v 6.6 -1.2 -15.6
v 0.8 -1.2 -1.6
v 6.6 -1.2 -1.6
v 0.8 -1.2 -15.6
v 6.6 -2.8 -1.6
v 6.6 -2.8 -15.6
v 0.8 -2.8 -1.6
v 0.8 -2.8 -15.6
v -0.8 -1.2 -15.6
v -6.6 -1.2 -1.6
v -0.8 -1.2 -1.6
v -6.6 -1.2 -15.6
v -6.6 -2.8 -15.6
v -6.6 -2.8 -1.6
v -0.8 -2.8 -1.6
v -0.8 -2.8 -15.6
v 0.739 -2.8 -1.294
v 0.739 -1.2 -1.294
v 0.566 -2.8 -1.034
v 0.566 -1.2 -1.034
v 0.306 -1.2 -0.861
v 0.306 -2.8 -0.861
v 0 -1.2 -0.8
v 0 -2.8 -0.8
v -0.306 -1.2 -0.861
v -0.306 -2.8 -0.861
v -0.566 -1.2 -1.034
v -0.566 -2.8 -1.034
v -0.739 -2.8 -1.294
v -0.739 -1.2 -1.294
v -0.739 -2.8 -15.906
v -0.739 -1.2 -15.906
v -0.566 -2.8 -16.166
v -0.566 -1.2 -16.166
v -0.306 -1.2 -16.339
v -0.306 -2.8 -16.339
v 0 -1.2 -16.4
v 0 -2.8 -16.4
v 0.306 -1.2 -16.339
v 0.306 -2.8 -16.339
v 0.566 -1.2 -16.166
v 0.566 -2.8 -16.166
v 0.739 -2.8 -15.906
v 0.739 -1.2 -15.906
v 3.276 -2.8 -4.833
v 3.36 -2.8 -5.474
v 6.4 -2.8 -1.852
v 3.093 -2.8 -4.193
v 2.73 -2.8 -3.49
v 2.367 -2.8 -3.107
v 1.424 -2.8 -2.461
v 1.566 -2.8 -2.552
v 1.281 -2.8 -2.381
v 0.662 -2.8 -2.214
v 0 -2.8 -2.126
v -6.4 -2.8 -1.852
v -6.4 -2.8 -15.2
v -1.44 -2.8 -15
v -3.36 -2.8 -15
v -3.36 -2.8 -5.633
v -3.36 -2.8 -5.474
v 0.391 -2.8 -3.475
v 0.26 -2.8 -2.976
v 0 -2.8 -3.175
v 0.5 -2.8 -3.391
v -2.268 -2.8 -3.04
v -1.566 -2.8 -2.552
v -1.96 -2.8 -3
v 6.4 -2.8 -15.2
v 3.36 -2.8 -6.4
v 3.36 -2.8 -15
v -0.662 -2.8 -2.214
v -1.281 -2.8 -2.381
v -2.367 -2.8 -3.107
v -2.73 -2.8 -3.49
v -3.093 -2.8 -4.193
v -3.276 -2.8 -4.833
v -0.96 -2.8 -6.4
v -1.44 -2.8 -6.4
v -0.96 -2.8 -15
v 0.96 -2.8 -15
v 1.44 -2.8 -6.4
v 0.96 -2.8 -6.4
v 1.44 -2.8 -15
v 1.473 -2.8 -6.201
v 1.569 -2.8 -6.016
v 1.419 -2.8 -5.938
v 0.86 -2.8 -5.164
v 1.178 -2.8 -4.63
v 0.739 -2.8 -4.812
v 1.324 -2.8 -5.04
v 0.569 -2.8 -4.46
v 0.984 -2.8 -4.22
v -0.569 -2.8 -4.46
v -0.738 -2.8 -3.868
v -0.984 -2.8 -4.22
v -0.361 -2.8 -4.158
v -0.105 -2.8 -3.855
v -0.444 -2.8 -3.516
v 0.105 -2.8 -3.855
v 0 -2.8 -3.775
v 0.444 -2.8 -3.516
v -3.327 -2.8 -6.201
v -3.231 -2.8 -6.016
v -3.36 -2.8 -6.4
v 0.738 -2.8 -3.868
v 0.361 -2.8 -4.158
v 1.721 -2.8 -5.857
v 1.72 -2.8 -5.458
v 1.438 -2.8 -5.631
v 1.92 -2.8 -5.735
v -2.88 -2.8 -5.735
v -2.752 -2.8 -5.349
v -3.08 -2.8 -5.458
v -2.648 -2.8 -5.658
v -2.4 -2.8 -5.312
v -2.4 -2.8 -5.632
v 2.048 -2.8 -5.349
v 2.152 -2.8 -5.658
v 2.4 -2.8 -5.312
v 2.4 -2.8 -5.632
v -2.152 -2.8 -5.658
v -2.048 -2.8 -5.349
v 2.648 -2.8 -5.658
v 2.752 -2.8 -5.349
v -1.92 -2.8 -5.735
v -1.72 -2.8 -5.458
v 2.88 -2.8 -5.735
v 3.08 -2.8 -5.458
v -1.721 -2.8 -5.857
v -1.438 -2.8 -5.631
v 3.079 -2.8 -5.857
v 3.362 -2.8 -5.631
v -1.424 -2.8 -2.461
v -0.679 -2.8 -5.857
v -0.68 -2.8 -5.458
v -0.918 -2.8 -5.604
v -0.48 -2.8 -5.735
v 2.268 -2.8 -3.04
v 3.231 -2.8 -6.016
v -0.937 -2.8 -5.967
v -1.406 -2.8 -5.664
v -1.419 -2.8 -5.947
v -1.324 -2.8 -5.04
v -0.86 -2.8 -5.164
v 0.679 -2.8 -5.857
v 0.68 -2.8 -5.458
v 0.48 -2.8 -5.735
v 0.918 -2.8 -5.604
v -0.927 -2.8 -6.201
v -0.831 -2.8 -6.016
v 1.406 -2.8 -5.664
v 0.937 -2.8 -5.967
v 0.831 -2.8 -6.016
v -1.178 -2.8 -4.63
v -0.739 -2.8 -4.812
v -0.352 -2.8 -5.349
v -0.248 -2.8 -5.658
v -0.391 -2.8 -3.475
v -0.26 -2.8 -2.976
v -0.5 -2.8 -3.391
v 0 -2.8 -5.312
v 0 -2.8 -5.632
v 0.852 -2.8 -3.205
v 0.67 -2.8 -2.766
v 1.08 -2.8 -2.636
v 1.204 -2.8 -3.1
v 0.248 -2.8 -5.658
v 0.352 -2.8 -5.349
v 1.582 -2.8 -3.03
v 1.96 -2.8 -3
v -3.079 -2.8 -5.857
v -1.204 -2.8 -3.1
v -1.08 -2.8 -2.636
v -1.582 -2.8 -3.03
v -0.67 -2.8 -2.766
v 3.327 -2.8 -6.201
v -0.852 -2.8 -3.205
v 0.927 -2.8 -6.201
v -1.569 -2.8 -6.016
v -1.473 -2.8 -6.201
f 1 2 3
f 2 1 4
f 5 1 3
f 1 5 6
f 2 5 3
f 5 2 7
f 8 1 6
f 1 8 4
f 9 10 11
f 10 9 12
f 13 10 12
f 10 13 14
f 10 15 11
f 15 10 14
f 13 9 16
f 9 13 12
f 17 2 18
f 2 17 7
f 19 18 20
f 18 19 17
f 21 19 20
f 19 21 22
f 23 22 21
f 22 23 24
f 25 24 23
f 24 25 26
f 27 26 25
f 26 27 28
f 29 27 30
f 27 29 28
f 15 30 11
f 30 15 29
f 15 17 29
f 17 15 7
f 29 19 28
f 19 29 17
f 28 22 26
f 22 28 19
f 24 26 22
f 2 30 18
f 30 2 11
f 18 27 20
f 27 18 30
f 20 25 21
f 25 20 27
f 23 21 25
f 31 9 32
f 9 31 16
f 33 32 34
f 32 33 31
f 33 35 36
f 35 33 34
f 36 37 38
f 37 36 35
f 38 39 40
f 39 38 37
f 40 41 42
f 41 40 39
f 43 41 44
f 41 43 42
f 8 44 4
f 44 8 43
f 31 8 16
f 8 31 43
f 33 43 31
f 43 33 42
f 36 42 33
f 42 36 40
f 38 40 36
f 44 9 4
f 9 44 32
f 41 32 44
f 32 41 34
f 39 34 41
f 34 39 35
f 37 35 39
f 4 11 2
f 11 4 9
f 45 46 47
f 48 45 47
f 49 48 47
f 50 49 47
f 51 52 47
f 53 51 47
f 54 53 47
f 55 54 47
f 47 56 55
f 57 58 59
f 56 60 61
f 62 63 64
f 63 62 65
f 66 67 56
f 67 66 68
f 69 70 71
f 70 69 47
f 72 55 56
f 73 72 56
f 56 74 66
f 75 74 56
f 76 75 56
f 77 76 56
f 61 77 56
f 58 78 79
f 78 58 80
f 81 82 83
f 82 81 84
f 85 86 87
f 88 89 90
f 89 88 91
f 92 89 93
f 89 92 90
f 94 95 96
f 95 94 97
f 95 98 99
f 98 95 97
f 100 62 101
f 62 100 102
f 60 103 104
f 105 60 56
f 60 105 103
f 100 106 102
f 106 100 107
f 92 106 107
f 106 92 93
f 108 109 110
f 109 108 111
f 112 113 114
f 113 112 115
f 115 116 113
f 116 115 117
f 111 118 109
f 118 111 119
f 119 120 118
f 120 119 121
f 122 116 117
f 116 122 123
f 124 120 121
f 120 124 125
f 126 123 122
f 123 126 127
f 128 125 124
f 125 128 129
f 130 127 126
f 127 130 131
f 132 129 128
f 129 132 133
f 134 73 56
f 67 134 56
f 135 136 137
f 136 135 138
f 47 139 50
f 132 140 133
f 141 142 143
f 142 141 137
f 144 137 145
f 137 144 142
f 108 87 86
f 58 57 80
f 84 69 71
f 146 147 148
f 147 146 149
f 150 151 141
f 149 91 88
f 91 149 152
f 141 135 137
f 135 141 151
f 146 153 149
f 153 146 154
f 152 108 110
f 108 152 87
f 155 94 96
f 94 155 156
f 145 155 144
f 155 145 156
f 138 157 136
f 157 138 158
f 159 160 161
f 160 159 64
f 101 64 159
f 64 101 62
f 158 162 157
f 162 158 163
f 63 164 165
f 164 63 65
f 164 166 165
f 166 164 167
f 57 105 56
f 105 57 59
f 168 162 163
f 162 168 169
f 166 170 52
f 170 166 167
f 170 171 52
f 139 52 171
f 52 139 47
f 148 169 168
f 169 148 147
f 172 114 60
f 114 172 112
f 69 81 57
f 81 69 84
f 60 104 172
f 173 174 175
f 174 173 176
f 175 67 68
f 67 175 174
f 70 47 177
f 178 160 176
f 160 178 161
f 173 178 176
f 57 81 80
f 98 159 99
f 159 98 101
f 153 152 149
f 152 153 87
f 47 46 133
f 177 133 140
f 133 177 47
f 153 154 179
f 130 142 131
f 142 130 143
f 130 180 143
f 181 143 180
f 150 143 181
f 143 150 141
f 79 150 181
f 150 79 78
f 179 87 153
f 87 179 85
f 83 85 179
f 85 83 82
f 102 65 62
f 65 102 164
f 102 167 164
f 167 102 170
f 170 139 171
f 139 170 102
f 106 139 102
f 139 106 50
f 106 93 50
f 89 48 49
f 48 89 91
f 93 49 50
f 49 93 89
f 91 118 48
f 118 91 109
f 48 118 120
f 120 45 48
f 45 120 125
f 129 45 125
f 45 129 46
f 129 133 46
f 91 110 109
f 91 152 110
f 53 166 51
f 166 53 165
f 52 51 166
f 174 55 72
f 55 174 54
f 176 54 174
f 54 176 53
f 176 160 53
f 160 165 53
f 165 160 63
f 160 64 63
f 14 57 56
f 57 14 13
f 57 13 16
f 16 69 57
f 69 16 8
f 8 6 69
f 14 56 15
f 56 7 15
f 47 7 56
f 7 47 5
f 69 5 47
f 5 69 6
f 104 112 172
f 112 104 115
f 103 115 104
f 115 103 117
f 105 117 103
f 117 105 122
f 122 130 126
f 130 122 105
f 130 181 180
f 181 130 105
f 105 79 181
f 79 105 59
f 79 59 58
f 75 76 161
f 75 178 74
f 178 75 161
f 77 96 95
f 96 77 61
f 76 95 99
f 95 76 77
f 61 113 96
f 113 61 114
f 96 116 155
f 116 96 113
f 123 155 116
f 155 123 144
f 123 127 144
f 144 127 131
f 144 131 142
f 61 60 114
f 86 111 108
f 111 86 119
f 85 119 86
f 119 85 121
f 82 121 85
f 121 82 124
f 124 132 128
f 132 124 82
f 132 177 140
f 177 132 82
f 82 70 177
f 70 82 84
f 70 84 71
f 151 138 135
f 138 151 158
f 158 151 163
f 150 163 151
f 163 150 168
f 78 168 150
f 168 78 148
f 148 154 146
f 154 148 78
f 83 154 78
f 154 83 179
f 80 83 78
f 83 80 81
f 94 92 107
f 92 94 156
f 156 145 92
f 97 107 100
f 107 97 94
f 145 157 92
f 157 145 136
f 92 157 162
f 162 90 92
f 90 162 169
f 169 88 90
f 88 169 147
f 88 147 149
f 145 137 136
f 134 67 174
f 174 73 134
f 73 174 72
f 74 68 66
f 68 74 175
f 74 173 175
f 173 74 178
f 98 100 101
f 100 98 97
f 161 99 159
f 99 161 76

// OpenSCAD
use <../lib.scad>
use <s/60601s01.scad>
$fa=1; $fs=0.2;
function ldraw_lib__60601p01(realsolid=false) = [
// 0 Glass for Window  1 x  2 x  2 with Tan Gothic Ornament Pattern
// 0 Name: 60601p01.dat
// 0 Author: Ulrich Röder [UR]
// 0 !LDRAW_ORG Part UPDATE 2019-02
// 0 !LICENSE Licensed under CC BY 2.0 and CC BY 4.0 : see CAreadme.txt
// 
// 0 BFC CERTIFY CCW
  [0,"BFC","CERTIFY"],
  [0,"BFC","CCW"],
// 
// 0 !HISTORY 2019-09-09 [PTadmin] Official Update 2019-02
// 
// 
// 1 16 0 0 0 1 0 0 0 1 0 0 0 1 s\60601s01.dat
  [1,16,0,0,0,1,0,0,0,1,0,0,0,1, ldraw_lib__s__60601s01(realsolid)],
// 
// 0 BFC NOCLIP
  [0,"BFC","NOCLIP"],
// 0 // Tan
// 3 19 8.19 12.083 -7 8.4 13.684 -7 16 4.631 -7
  [3,19,8.19,12.083,-7,8.4,13.684,-7,16,4.631,-7],
// 3 19 7.732 10.482 -7 8.19 12.083 -7 16 4.631 -7
  [3,19,7.732,10.482,-7,8.19,12.083,-7,16,4.631,-7],
// 3 19 6.825 8.7245 -7 7.732 10.482 -7 16 4.631 -7
  [3,19,6.825,8.7245,-7,7.732,10.482,-7,16,4.631,-7],
// 3 19 5.918 7.767 -7 6.825 8.7245 -7 16 4.631 -7
  [3,19,5.918,7.767,-7,6.825,8.7245,-7,16,4.631,-7],
// 3 19 3.5595 6.1515 -7 3.916 6.38 -7 16 4.631 -7
  [3,19,3.5595,6.1515,-7,3.916,6.38,-7,16,4.631,-7],
// 3 19 3.203 5.953 -7 3.5595 6.1515 -7 16 4.631 -7
  [3,19,3.203,5.953,-7,3.5595,6.1515,-7,16,4.631,-7],
// 3 19 1.655 5.5345 -7 3.203 5.953 -7 16 4.631 -7
  [3,19,1.655,5.5345,-7,3.203,5.953,-7,16,4.631,-7],
// 3 19 0 5.316 -7 1.655 5.5345 -7 16 4.631 -7
  [3,19,0,5.316,-7,1.655,5.5345,-7,16,4.631,-7],
// 3 19 16 4.631 -7 -16 4.631 -7 0 5.316 -7
  [3,19,16,4.631,-7,-16,4.631,-7,0,5.316,-7],
// 3 19 -16 38 -7 -3.6 37.5 -7 -8.4 37.5 -7
  [3,19,-16,38,-7,-3.6,37.5,-7,-8.4,37.5,-7],
// 3 19 -16 4.631 -7 -8.4 14.082 -7 -8.4 13.684 -7
  [3,19,-16,4.631,-7,-8.4,14.082,-7,-8.4,13.684,-7],
// 4 19 1.25 8.478 -7 0.65 7.439 -7 0 7.938 -7 0.977 8.687 -7
  [4,19,1.25,8.478,-7,0.65,7.439,-7,0,7.938,-7,0.977,8.687,-7],
// 4 19 -4.9 7.5 -7 -3.916 6.38 -7 -16 4.631 -7 -5.67 7.601 -7
  [4,19,-4.9,7.5,-7,-3.916,6.38,-7,-16,4.631,-7,-5.67,7.601,-7],
// 4 19 16 4.631 -7 8.4 16 -7 8.4 37.5 -7 16 38 -7
  [4,19,16,4.631,-7,8.4,16,-7,8.4,37.5,-7,16,38,-7],
// 3 19 -1.655 5.5345 -7 0 5.316 -7 -16 4.631 -7
  [3,19,-1.655,5.5345,-7,0,5.316,-7,-16,4.631,-7],
// 3 19 -3.203 5.953 -7 -1.655 5.5345 -7 -16 4.631 -7
  [3,19,-3.203,5.953,-7,-1.655,5.5345,-7,-16,4.631,-7],
// 3 19 -16 4.631 -7 -5.918 7.767 -7 -5.67 7.601 -7
  [3,19,-16,4.631,-7,-5.918,7.767,-7,-5.67,7.601,-7],
// 3 19 -6.825 8.7245 -7 -5.918 7.767 -7 -16 4.631 -7
  [3,19,-6.825,8.7245,-7,-5.918,7.767,-7,-16,4.631,-7],
// 3 19 -7.732 10.482 -7 -6.825 8.7245 -7 -16 4.631 -7
  [3,19,-7.732,10.482,-7,-6.825,8.7245,-7,-16,4.631,-7],
// 3 19 -8.19 12.083 -7 -7.732 10.482 -7 -16 4.631 -7
  [3,19,-8.19,12.083,-7,-7.732,10.482,-7,-16,4.631,-7],
// 3 19 -8.4 13.684 -7 -8.19 12.083 -7 -16 4.631 -7
  [3,19,-8.4,13.684,-7,-8.19,12.083,-7,-16,4.631,-7],
// 4 19 -2.4 16 -7 -3.6 16 -7 -3.6 37.5 -7 -2.4 37.5 -7
  [4,19,-2.4,16,-7,-3.6,16,-7,-3.6,37.5,-7,-2.4,37.5,-7],
// 4 19 3.6 16 -7 2.4 16 -7 2.4 37.5 -7 3.6 37.5 -7
  [4,19,3.6,16,-7,2.4,16,-7,2.4,37.5,-7,3.6,37.5,-7],
// 3 19 3.682 15.503 -7 3.922 15.04 -7 3.547 14.845 -7
  [3,19,3.682,15.503,-7,3.922,15.04,-7,3.547,14.845,-7],
// 4 19 2.151 12.911 -7 3.31 12.6 -7 2.9455 11.575 -7 1.8465 12.0305 -7
  [4,19,2.151,12.911,-7,3.31,12.6,-7,2.9455,11.575,-7,1.8465,12.0305,-7],
// 4 19 2.461 10.55 -7 1.422 11.15 -7 1.8465 12.0305 -7 2.9455 11.575 -7
  [4,19,2.461,10.55,-7,1.422,11.15,-7,1.8465,12.0305,-7,2.9455,11.575,-7],
// 4 19 -2.461 10.55 -7 -1.422 11.15 -7 -0.902 10.394 -7 -1.8455 9.67 -7
  [4,19,-2.461,10.55,-7,-1.422,11.15,-7,-0.902,10.394,-7,-1.8455,9.67,-7],
// 4 19 -0.262 9.638 -7 -1.11 8.79 -7 -1.8455 9.67 -7 -0.902 10.394 -7
  [4,19,-0.262,9.638,-7,-1.11,8.79,-7,-1.8455,9.67,-7,-0.902,10.394,-7],
// 4 19 1.11 8.79 -7 0.977 8.687 -7 0 9.437 -7 0.262 9.638 -7
  [4,19,1.11,8.79,-7,0.977,8.687,-7,0,9.437,-7,0.262,9.638,-7],
// 3 19 -8.4 14.082 -7 -8.318 15.503 -7 -8.078 15.04 -7
  [3,19,-8.4,14.082,-7,-8.318,15.503,-7,-8.078,15.04,-7],
// 4 19 -8.4 16 -7 -8.318 15.503 -7 -8.4 14.082 -7 -16 4.631 -7
  [4,19,-8.4,16,-7,-8.318,15.503,-7,-8.4,14.082,-7,-16,4.631,-7],
// 4 19 0.902 10.394 -7 1.8455 9.67 -7 1.11 8.79 -7 0.262 9.638 -7
  [4,19,0.902,10.394,-7,1.8455,9.67,-7,1.11,8.79,-7,0.262,9.638,-7],
// 4 19 1.8455 9.67 -7 0.902 10.394 -7 1.422 11.15 -7 2.461 10.55 -7
  [4,19,1.8455,9.67,-7,0.902,10.394,-7,1.422,11.15,-7,2.461,10.55,-7],
// 4 19 4.3 13.644 -7 3.596 14.077 -7 4.303 14.642 -7 4.8 14.337 -7
  [4,19,4.3,13.644,-7,3.596,14.077,-7,4.303,14.642,-7,4.8,14.337,-7],
// 4 19 -6.88 13.373 -7 -7.7 13.644 -7 -7.2 14.337 -7 -6.621 14.145 -7
  [4,19,-6.88,13.373,-7,-7.7,13.644,-7,-7.2,14.337,-7,-6.621,14.145,-7],
// 4 19 -6.621 14.145 -7 -6 14.08 -7 -6 13.28 -7 -6.88 13.373 -7
  [4,19,-6.621,14.145,-7,-6,14.08,-7,-6,13.28,-7,-6.88,13.373,-7],
// 4 19 5.12 13.373 -7 4.3 13.644 -7 4.8 14.337 -7 5.379 14.145 -7
  [4,19,5.12,13.373,-7,4.3,13.644,-7,4.8,14.337,-7,5.379,14.145,-7],
// 4 19 5.379 14.145 -7 6 14.08 -7 6 13.28 -7 5.12 13.373 -7
  [4,19,5.379,14.145,-7,6,14.08,-7,6,13.28,-7,5.12,13.373,-7],
// 4 19 -5.12 13.373 -7 -6 13.28 -7 -6 14.08 -7 -5.379 14.145 -7
  [4,19,-5.12,13.373,-7,-6,13.28,-7,-6,14.08,-7,-5.379,14.145,-7],
// 4 19 6.88 13.373 -7 6 13.28 -7 6 14.08 -7 6.621 14.145 -7
  [4,19,6.88,13.373,-7,6,13.28,-7,6,14.08,-7,6.621,14.145,-7],
// 4 19 -4.3 13.644 -7 -5.12 13.373 -7 -5.379 14.145 -7 -4.8 14.337 -7
  [4,19,-4.3,13.644,-7,-5.12,13.373,-7,-5.379,14.145,-7,-4.8,14.337,-7],
// 4 19 7.7 13.644 -7 6.88 13.373 -7 6.621 14.145 -7 7.2 14.337 -7
  [4,19,7.7,13.644,-7,6.88,13.373,-7,6.621,14.145,-7,7.2,14.337,-7],
// 4 19 -3.596 14.077 -7 -4.3 13.644 -7 -4.8 14.337 -7 -4.303 14.642 -7
  [4,19,-3.596,14.077,-7,-4.3,13.644,-7,-4.8,14.337,-7,-4.303,14.642,-7],
// 4 19 7.2 14.337 -7 7.697 14.642 -7 8.404 14.077 -7 7.7 13.644 -7
  [4,19,7.2,14.337,-7,7.697,14.642,-7,8.404,14.077,-7,7.7,13.644,-7],
// 3 19 -3.5595 6.1515 -7 -3.203 5.953 -7 -16 4.631 -7
  [3,19,-3.5595,6.1515,-7,-3.203,5.953,-7,-16,4.631,-7],
// 3 19 -3.916 6.38 -7 -3.5595 6.1515 -7 -16 4.631 -7
  [3,19,-3.916,6.38,-7,-3.5595,6.1515,-7,-16,4.631,-7],
// 4 19 -2.296 14.01 -7 -1.697 14.642 -7 -1.2 14.337 -7 -1.7 13.644 -7
  [4,19,-2.296,14.01,-7,-1.697,14.642,-7,-1.2,14.337,-7,-1.7,13.644,-7],
// 3 19 16 4.631 -7 5.67 7.601 -7 5.918 7.767 -7
  [3,19,16,4.631,-7,5.67,7.601,-7,5.918,7.767,-7],
// 3 19 7.697 14.642 -7 8.078 15.04 -7 8.404 14.077 -7
  [3,19,7.697,14.642,-7,8.078,15.04,-7,8.404,14.077,-7],
// 4 19 -2.296 14.01 -7 -3.516 14.16 -7 -3.548 14.868 -7 -2.343 14.918 -7
  [4,19,-2.296,14.01,-7,-3.516,14.16,-7,-3.548,14.868,-7,-2.343,14.918,-7],
// 4 19 -3.31 12.6 -7 -3.516 14.16 -7 -2.296 14.01 -7 -2.151 12.911 -7
  [4,19,-3.31,12.6,-7,-3.516,14.16,-7,-2.296,14.01,-7,-2.151,12.911,-7],
// 3 19 4.303 14.642 -7 3.547 14.845 -7 3.922 15.04 -7
  [3,19,4.303,14.642,-7,3.547,14.845,-7,3.922,15.04,-7],
// 3 19 -3.6 37.5 -7 -16 38 -7 -2.4 37.5 -7
  [3,19,-3.6,37.5,-7,-16,38,-7,-2.4,37.5,-7],
// 3 19 3.6 37.5 -7 16 38 -7 8.4 37.5 -7
  [3,19,3.6,37.5,-7,16,38,-7,8.4,37.5,-7],
// 4 19 1.7 13.644 -7 1.2 14.337 -7 1.697 14.642 -7 2.296 14.01 -7
  [4,19,1.7,13.644,-7,1.2,14.337,-7,1.697,14.642,-7,2.296,14.01,-7],
// 3 19 -2.318 15.503 -7 -2.078 15.04 -7 -2.343 14.918 -7
  [3,19,-2.318,15.503,-7,-2.078,15.04,-7,-2.343,14.918,-7],
// 4 19 3.31 12.6 -7 2.151 12.911 -7 2.296 14.01 -7 3.516 14.16 -7
  [4,19,3.31,12.6,-7,2.151,12.911,-7,2.296,14.01,-7,3.516,14.16,-7],
// 4 19 -2.296 14.01 -7 -2.343 14.918 -7 -2.078 15.04 -7 -1.697 14.642 -7
  [4,19,-2.296,14.01,-7,-2.343,14.918,-7,-2.078,15.04,-7,-1.697,14.642,-7],
// 4 19 2.343 14.918 -7 2.296 14.01 -7 1.697 14.642 -7 2.078 15.04 -7
  [4,19,2.343,14.918,-7,2.296,14.01,-7,1.697,14.642,-7,2.078,15.04,-7],
// 4 19 3.516 14.16 -7 3.547 14.845 -7 4.303 14.642 -7 3.596 14.077 -7
  [4,19,3.516,14.16,-7,3.547,14.845,-7,4.303,14.642,-7,3.596,14.077,-7],
// 4 19 -2.9455 11.575 -7 -1.8465 12.0305 -7 -1.422 11.15 -7 -2.461 10.55 -7
  [4,19,-2.9455,11.575,-7,-1.8465,12.0305,-7,-1.422,11.15,-7,-2.461,10.55,-7],
// 4 19 -3.31 12.6 -7 -2.151 12.911 -7 -1.8465 12.0305 -7 -2.9455 11.575 -7
  [4,19,-3.31,12.6,-7,-2.151,12.911,-7,-1.8465,12.0305,-7,-2.9455,11.575,-7],
// 4 19 -1.2 14.337 -7 -0.621 14.145 -7 -0.88 13.373 -7 -1.7 13.644 -7
  [4,19,-1.2,14.337,-7,-0.621,14.145,-7,-0.88,13.373,-7,-1.7,13.644,-7],
// 4 19 -0.977 8.687 -7 0 7.938 -7 -0.65 7.439 -7 -1.25 8.478 -7
  [4,19,-0.977,8.687,-7,0,7.938,-7,-0.65,7.439,-7,-1.25,8.478,-7],
// 4 19 0 9.437 -7 0.977 8.687 -7 0 7.938 -7 -0.977 8.687 -7
  [4,19,0,9.437,-7,0.977,8.687,-7,0,7.938,-7,-0.977,8.687,-7],
// 4 19 -0.621 14.145 -7 0 14.08 -7 0 13.28 -7 -0.88 13.373 -7
  [4,19,-0.621,14.145,-7,0,14.08,-7,0,13.28,-7,-0.88,13.373,-7],
// 4 19 2.1305 8.0135 -7 1.675 6.9145 -7 0.65 7.439 -7 1.25 8.478 -7
  [4,19,2.1305,8.0135,-7,1.675,6.9145,-7,0.65,7.439,-7,1.25,8.478,-7],
// 4 19 3.011 7.749 -7 2.7 6.59 -7 1.675 6.9145 -7 2.1305 8.0135 -7
  [4,19,3.011,7.749,-7,2.7,6.59,-7,1.675,6.9145,-7,2.1305,8.0135,-7],
// 4 19 -16 38 -7 -8.4 37.5 -7 -8.4 16 -7 -16 4.631 -7
  [4,19,-16,38,-7,-8.4,37.5,-7,-8.4,16,-7,-16,4.631,-7],
// 4 19 0 14.08 -7 0.621 14.145 -7 0.88 13.373 -7 0 13.28 -7
  [4,19,0,14.08,-7,0.621,14.145,-7,0.88,13.373,-7,0,13.28,-7],
// 4 19 3.011 7.749 -7 3.9555 7.5745 -7 3.916 6.38 -7 2.7 6.59 -7
  [4,19,3.011,7.749,-7,3.9555,7.5745,-7,3.916,6.38,-7,2.7,6.59,-7],
// 3 19 3.9555 7.5745 -7 4.9 7.5 -7 3.916 6.38 -7
  [3,19,3.9555,7.5745,-7,4.9,7.5,-7,3.916,6.38,-7],
// 4 19 16 4.631 -7 3.916 6.38 -7 4.9 7.5 -7 5.67 7.601 -7
  [4,19,16,4.631,-7,3.916,6.38,-7,4.9,7.5,-7,5.67,7.601,-7],
// 4 19 1.7 13.644 -7 0.88 13.373 -7 0.621 14.145 -7 1.2 14.337 -7
  [4,19,1.7,13.644,-7,0.88,13.373,-7,0.621,14.145,-7,1.2,14.337,-7],
// 4 19 -8.4 14.082 -7 -7.697 14.642 -7 -7.2 14.337 -7 -7.7 13.644 -7
  [4,19,-8.4,14.082,-7,-7.697,14.642,-7,-7.2,14.337,-7,-7.7,13.644,-7],
// 4 19 -16 38 -7 16 38 -7 3.6 37.5 -7 2.4 37.5 -7
  [4,19,-16,38,-7,16,38,-7,3.6,37.5,-7,2.4,37.5,-7],
// 3 19 -8.4 14.082 -7 -8.078 15.04 -7 -7.697 14.642 -7
  [3,19,-8.4,14.082,-7,-8.078,15.04,-7,-7.697,14.642,-7],
// 4 19 -1.675 6.9145 -7 -2.7 6.59 -7 -3.9555 7.5745 -7 -3.011 7.749 -7
  [4,19,-1.675,6.9145,-7,-2.7,6.59,-7,-3.9555,7.5745,-7,-3.011,7.749,-7],
// 4 19 -2.7 6.59 -7 -3.916 6.38 -7 -4.9 7.5 -7 -3.9555 7.5745 -7
  [4,19,-2.7,6.59,-7,-3.916,6.38,-7,-4.9,7.5,-7,-3.9555,7.5745,-7],
// 3 19 8.4 16 -7 16 4.631 -7 8.318 15.503 -7
  [3,19,8.4,16,-7,16,4.631,-7,8.318,15.503,-7],
// 4 19 -1.25 8.478 -7 -0.65 7.439 -7 -1.675 6.9145 -7 -2.1305 8.0135 -7
  [4,19,-1.25,8.478,-7,-0.65,7.439,-7,-1.675,6.9145,-7,-2.1305,8.0135,-7],
// 3 19 -3.011 7.749 -7 -2.1305 8.0135 -7 -1.675 6.9145 -7
  [3,19,-3.011,7.749,-7,-2.1305,8.0135,-7,-1.675,6.9145,-7],
// 3 19 -16 38 -7 2.4 37.5 -7 -2.4 37.5 -7
  [3,19,-16,38,-7,2.4,37.5,-7,-2.4,37.5,-7],
// 4 19 -1.11 8.79 -7 -0.262 9.638 -7 0 9.437 -7 -0.977 8.687 -7
  [4,19,-1.11,8.79,-7,-0.262,9.638,-7,0,9.437,-7,-0.977,8.687,-7],
// 4 19 2.296 14.01 -7 2.343 14.918 -7 3.547 14.845 -7 3.516 14.16 -7
  [4,19,2.296,14.01,-7,2.343,14.918,-7,3.547,14.845,-7,3.516,14.16,-7],
// 3 19 16 4.631 -7 8.4 13.684 -7 8.404 14.077 -7
  [3,19,16,4.631,-7,8.4,13.684,-7,8.404,14.077,-7],
// 4 19 16 4.631 -7 8.404 14.077 -7 8.078 15.04 -7 8.318 15.503 -7
  [4,19,16,4.631,-7,8.404,14.077,-7,8.078,15.04,-7,8.318,15.503,-7],
// 3 19 2.343 14.918 -7 2.078 15.04 -7 2.318 15.503 -7
  [3,19,2.343,14.918,-7,2.078,15.04,-7,2.318,15.503,-7],
// 4 19 -3.548 14.868 -7 -3.516 14.16 -7 -3.596 14.077 -7 -4.303 14.642 -7
  [4,19,-3.548,14.868,-7,-3.516,14.16,-7,-3.596,14.077,-7,-4.303,14.642,-7],
// 3 19 -4.303 14.642 -7 -3.922 15.04 -7 -3.548 14.868 -7
  [3,19,-4.303,14.642,-7,-3.922,15.04,-7,-3.548,14.868,-7],
// 3 19 -3.682 15.503 -7 -3.548 14.868 -7 -3.922 15.04 -7
  [3,19,-3.682,15.503,-7,-3.548,14.868,-7,-3.922,15.04,-7],
// 4 19 -2.318 15.503 -7 -2.343 14.918 -7 -3.548 14.868 -7 -3.682 15.503 -7
  [4,19,-2.318,15.503,-7,-2.343,14.918,-7,-3.548,14.868,-7,-3.682,15.503,-7],
// 4 19 -2.4 16 -7 -2.318 15.503 -7 -3.682 15.503 -7 -3.6 16 -7
  [4,19,-2.4,16,-7,-2.318,15.503,-7,-3.682,15.503,-7,-3.6,16,-7],
// 4 19 2.318 15.503 -7 3.682 15.503 -7 3.547 14.845 -7 2.343 14.918 -7
  [4,19,2.318,15.503,-7,3.682,15.503,-7,3.547,14.845,-7,2.343,14.918,-7],
// 4 19 2.4 16 -7 3.6 16 -7 3.682 15.503 -7 2.318 15.503 -7
  [4,19,2.4,16,-7,3.6,16,-7,3.682,15.503,-7,2.318,15.503,-7],
// 
// 0 // Main
// 4 16 1.25 8.478 -7 0.977 8.687 -7 1.11 8.79 -7 2.1305 8.0135 -7
  [4,16,1.25,8.478,-7,0.977,8.687,-7,1.11,8.79,-7,2.1305,8.0135,-7],
// 4 16 3.9555 7.5745 -7 3.011 7.749 -7 2.1305 8.0135 -7 1.11 8.79 -7
  [4,16,3.9555,7.5745,-7,3.011,7.749,-7,2.1305,8.0135,-7,1.11,8.79,-7],
// 4 16 1.11 8.79 -7 5.67 7.601 -7 4.9 7.5 -7 3.9555 7.5745 -7
  [4,16,1.11,8.79,-7,5.67,7.601,-7,4.9,7.5,-7,3.9555,7.5745,-7],
// 4 16 1.11 8.79 -7 1.8455 9.67 -7 5.918 7.767 -7 5.67 7.601 -7
  [4,16,1.11,8.79,-7,1.8455,9.67,-7,5.918,7.767,-7,5.67,7.601,-7],
// 3 16 1.8455 9.67 -7 2.461 10.55 -7 5.918 7.767 -7
  [3,16,1.8455,9.67,-7,2.461,10.55,-7,5.918,7.767,-7],
// 4 16 6.825 8.7245 -7 2.9455 11.575 -7 3.31 12.6 -7 7.732 10.482 -7
  [4,16,6.825,8.7245,-7,2.9455,11.575,-7,3.31,12.6,-7,7.732,10.482,-7],
// 4 16 5.918 7.767 -7 2.461 10.55 -7 2.9455 11.575 -7 6.825 8.7245 -7
  [4,16,5.918,7.767,-7,2.461,10.55,-7,2.9455,11.575,-7,6.825,8.7245,-7],
// 4 16 5.12 13.373 -7 7.732 10.482 -7 3.31 12.6 -7 4.3 13.644 -7
  [4,16,5.12,13.373,-7,7.732,10.482,-7,3.31,12.6,-7,4.3,13.644,-7],
// 3 16 7.732 10.482 -7 5.12 13.373 -7 6 13.28 -7
  [3,16,7.732,10.482,-7,5.12,13.373,-7,6,13.28,-7],
// 4 16 6 13.28 -7 6.88 13.373 -7 8.19 12.083 -7 7.732 10.482 -7
  [4,16,6,13.28,-7,6.88,13.373,-7,8.19,12.083,-7,7.732,10.482,-7],
// 4 16 6.88 13.373 -7 7.7 13.644 -7 8.4 13.684 -7 8.19 12.083 -7
  [4,16,6.88,13.373,-7,7.7,13.644,-7,8.4,13.684,-7,8.19,12.083,-7],
// 3 16 7.7 13.644 -7 8.404 14.077 -7 8.4 13.684 -7
  [3,16,7.7,13.644,-7,8.404,14.077,-7,8.4,13.684,-7],
// 3 16 3.31 12.6 -7 3.596 14.077 -7 4.3 13.644 -7
  [3,16,3.31,12.6,-7,3.596,14.077,-7,4.3,13.644,-7],
// 3 16 3.31 12.6 -7 3.516 14.16 -7 3.596 14.077 -7
  [3,16,3.31,12.6,-7,3.516,14.16,-7,3.596,14.077,-7],
// 4 16 1.675 6.9145 -7 2.7 6.59 -7 3.5595 6.1515 -7 3.203 5.953 -7
  [4,16,1.675,6.9145,-7,2.7,6.59,-7,3.5595,6.1515,-7,3.203,5.953,-7],
// 3 16 3.916 6.38 -7 3.5595 6.1515 -7 2.7 6.59 -7
  [3,16,3.916,6.38,-7,3.5595,6.1515,-7,2.7,6.59,-7],
// 4 16 -1.655 5.5345 -7 -2.7 6.59 -7 1.655 5.5345 -7 0 5.316 -7
  [4,16,-1.655,5.5345,-7,-2.7,6.59,-7,1.655,5.5345,-7,0,5.316,-7],
// 4 16 -2.7 6.59 -7 -1.675 6.9145 -7 3.203 5.953 -7 1.655 5.5345 -7
  [4,16,-2.7,6.59,-7,-1.675,6.9145,-7,3.203,5.953,-7,1.655,5.5345,-7],
// 3 16 -1.675 6.9145 -7 -0.65 7.439 -7 3.203 5.953 -7
  [3,16,-1.675,6.9145,-7,-0.65,7.439,-7,3.203,5.953,-7],
// 4 16 3.203 5.953 -7 -0.65 7.439 -7 0.65 7.439 -7 1.675 6.9145 -7
  [4,16,3.203,5.953,-7,-0.65,7.439,-7,0.65,7.439,-7,1.675,6.9145,-7],
// 3 16 -0.65 7.439 -7 0 7.938 -7 0.65 7.439 -7
  [3,16,-0.65,7.439,-7,0,7.938,-7,0.65,7.439,-7],
// 4 16 -16.5 39 -7 -16 38 -7 -16 4.631 -7 -16.5 4 -7
  [4,16,-16.5,39,-7,-16,38,-7,-16,4.631,-7,-16.5,4,-7],
// 3 16 -16 38 -7 -16.5 39 -7 -2 39 -7
  [3,16,-16,38,-7,-16.5,39,-7,-2,39,-7],
// 4 16 -2 39 -7 2 39 -7 16 38 -7 -16 38 -7
  [4,16,-2,39,-7,2,39,-7,16,38,-7,-16,38,-7],
// 3 16 2 39 -7 16.5 39 -7 16 38 -7
  [3,16,2,39,-7,16.5,39,-7,16,38,-7],
// 3 16 -16.5 4 -7 -16 4.631 -7 -2 4 -7
  [3,16,-16.5,4,-7,-16,4.631,-7,-2,4,-7],
// 3 16 -16 4.631 -7 2 4 -7 -2 4 -7
  [3,16,-16,4.631,-7,2,4,-7,-2,4,-7],
// 4 16 2 4 -7 -16 4.631 -7 16 4.631 -7 16.5 4 -7
  [4,16,2,4,-7,-16,4.631,-7,16,4.631,-7,16.5,4,-7],
// 4 16 16 4.631 -7 16 38 -7 16.5 39 -7 16.5 4 -7
  [4,16,16,4.631,-7,16,38,-7,16.5,39,-7,16.5,4,-7],
// 4 16 -8.078 15.04 -7 -6.621 14.145 -7 -7.2 14.337 -7 -7.697 14.642 -7
  [4,16,-8.078,15.04,-7,-6.621,14.145,-7,-7.2,14.337,-7,-7.697,14.642,-7],
// 4 16 -6.621 14.145 -7 -8.078 15.04 -7 -8.318 15.503 -7 -6 14.08 -7
  [4,16,-6.621,14.145,-7,-8.078,15.04,-7,-8.318,15.503,-7,-6,14.08,-7],
// 4 16 -6 14.08 -7 -8.318 15.503 -7 -8.4 16 -7 -5.379 14.145 -7
  [4,16,-6,14.08,-7,-8.318,15.503,-7,-8.4,16,-7,-5.379,14.145,-7],
// 4 16 -5.379 14.145 -7 -8.4 16 -7 -4.303 14.642 -7 -4.8 14.337 -7
  [4,16,-5.379,14.145,-7,-8.4,16,-7,-4.303,14.642,-7,-4.8,14.337,-7],
// 4 16 -3.682 15.503 -7 -3.922 15.04 -7 -4.303 14.642 -7 -8.4 16 -7
  [4,16,-3.682,15.503,-7,-3.922,15.04,-7,-4.303,14.642,-7,-8.4,16,-7],
// 4 16 -3.682 15.503 -7 -8.4 16 -7 -8.4 37.5 -7 -3.6 16 -7
  [4,16,-3.682,15.503,-7,-8.4,16,-7,-8.4,37.5,-7,-3.6,16,-7],
// 3 16 -3.6 16 -7 -8.4 37.5 -7 -3.6 37.5 -7
  [3,16,-3.6,16,-7,-8.4,37.5,-7,-3.6,37.5,-7],
// 3 16 -6.825 8.7245 -7 -7.732 10.482 -7 -1.25 8.478 -7
  [3,16,-6.825,8.7245,-7,-7.732,10.482,-7,-1.25,8.478,-7],
// 4 16 -1.25 8.478 -7 -2.1305 8.0135 -7 -5.918 7.767 -7 -6.825 8.7245 -7
  [4,16,-1.25,8.478,-7,-2.1305,8.0135,-7,-5.918,7.767,-7,-6.825,8.7245,-7],
// 4 16 -2.461 10.55 -7 -1.8455 9.67 -7 -8.19 12.083 -7 -8.4 13.684 -7
  [4,16,-2.461,10.55,-7,-1.8455,9.67,-7,-8.19,12.083,-7,-8.4,13.684,-7],
// 4 16 -7.732 10.482 -7 -8.19 12.083 -7 -1.8455 9.67 -7 -1.11 8.79 -7
  [4,16,-7.732,10.482,-7,-8.19,12.083,-7,-1.8455,9.67,-7,-1.11,8.79,-7],
// 4 16 -8.4 13.684 -7 -7.7 13.644 -7 -6.88 13.373 -7 -2.461 10.55 -7
  [4,16,-8.4,13.684,-7,-7.7,13.644,-7,-6.88,13.373,-7,-2.461,10.55,-7],
// 4 16 -2.9455 11.575 -7 -2.461 10.55 -7 -6.88 13.373 -7 -6 13.28 -7
  [4,16,-2.9455,11.575,-7,-2.461,10.55,-7,-6.88,13.373,-7,-6,13.28,-7],
// 4 16 -3.31 12.6 -7 -2.9455 11.575 -7 -6 13.28 -7 -5.12 13.373 -7
  [4,16,-3.31,12.6,-7,-2.9455,11.575,-7,-6,13.28,-7,-5.12,13.373,-7],
// 3 16 -5.12 13.373 -7 -4.3 13.644 -7 -3.31 12.6 -7
  [3,16,-5.12,13.373,-7,-4.3,13.644,-7,-3.31,12.6,-7],
// 3 16 -3.31 12.6 -7 -4.3 13.644 -7 -3.596 14.077 -7
  [3,16,-3.31,12.6,-7,-4.3,13.644,-7,-3.596,14.077,-7],
// 3 16 -3.31 12.6 -7 -3.596 14.077 -7 -3.516 14.16 -7
  [3,16,-3.31,12.6,-7,-3.596,14.077,-7,-3.516,14.16,-7],
// 3 16 -8.4 13.684 -7 -8.4 14.082 -7 -7.7 13.644 -7
  [3,16,-8.4,13.684,-7,-8.4,14.082,-7,-7.7,13.644,-7],
// 4 16 4.8 14.337 -7 4.303 14.642 -7 3.922 15.04 -7 5.379 14.145 -7
  [4,16,4.8,14.337,-7,4.303,14.642,-7,3.922,15.04,-7,5.379,14.145,-7],
// 4 16 5.379 14.145 -7 3.922 15.04 -7 3.682 15.503 -7 6 14.08 -7
  [4,16,5.379,14.145,-7,3.922,15.04,-7,3.682,15.503,-7,6,14.08,-7],
// 4 16 3.6 16 -7 6.621 14.145 -7 6 14.08 -7 3.682 15.503 -7
  [4,16,3.6,16,-7,6.621,14.145,-7,6,14.08,-7,3.682,15.503,-7],
// 4 16 6.621 14.145 -7 3.6 16 -7 7.697 14.642 -7 7.2 14.337 -7
  [4,16,6.621,14.145,-7,3.6,16,-7,7.697,14.642,-7,7.2,14.337,-7],
// 4 16 7.697 14.642 -7 3.6 16 -7 8.318 15.503 -7 8.078 15.04 -7
  [4,16,7.697,14.642,-7,3.6,16,-7,8.318,15.503,-7,8.078,15.04,-7],
// 4 16 8.318 15.503 -7 3.6 16 -7 3.6 37.5 -7 8.4 16 -7
  [4,16,8.318,15.503,-7,3.6,16,-7,3.6,37.5,-7,8.4,16,-7],
// 3 16 8.4 16 -7 3.6 37.5 -7 8.4 37.5 -7
  [3,16,8.4,16,-7,3.6,37.5,-7,8.4,37.5,-7],
// 4 16 -1.2 14.337 -7 -1.697 14.642 -7 -2.078 15.04 -7 -0.621 14.145 -7
  [4,16,-1.2,14.337,-7,-1.697,14.642,-7,-2.078,15.04,-7,-0.621,14.145,-7],
// 3 16 -0.621 14.145 -7 -2.078 15.04 -7 0 14.08 -7
  [3,16,-0.621,14.145,-7,-2.078,15.04,-7,0,14.08,-7],
// 4 16 -2.078 15.04 -7 -2.318 15.503 -7 0.621 14.145 -7 0 14.08 -7
  [4,16,-2.078,15.04,-7,-2.318,15.503,-7,0.621,14.145,-7,0,14.08,-7],
// 4 16 -2.318 15.503 -7 -2.4 16 -7 1.2 14.337 -7 0.621 14.145 -7
  [4,16,-2.318,15.503,-7,-2.4,16,-7,1.2,14.337,-7,0.621,14.145,-7],
// 4 16 2.078 15.04 -7 1.697 14.642 -7 1.2 14.337 -7 -2.4 16 -7
  [4,16,2.078,15.04,-7,1.697,14.642,-7,1.2,14.337,-7,-2.4,16,-7],
// 4 16 2.078 15.04 -7 -2.4 16 -7 2.4 16 -7 2.318 15.503 -7
  [4,16,2.078,15.04,-7,-2.4,16,-7,2.4,16,-7,2.318,15.503,-7],
// 4 16 -2.4 16 -7 -2.4 37.5 -7 2.4 37.5 -7 2.4 16 -7
  [4,16,-2.4,16,-7,-2.4,37.5,-7,2.4,37.5,-7,2.4,16,-7],
// 4 16 -1.422 11.15 -7 -1.8465 12.0305 -7 1.422 11.15 -7 0.902 10.394 -7
  [4,16,-1.422,11.15,-7,-1.8465,12.0305,-7,1.422,11.15,-7,0.902,10.394,-7],
// 3 16 -1.8465 12.0305 -7 -2.151 12.911 -7 1.422 11.15 -7
  [3,16,-1.8465,12.0305,-7,-2.151,12.911,-7,1.422,11.15,-7],
// 4 16 -0.902 10.394 -7 -1.422 11.15 -7 0.902 10.394 -7 0.262 9.638 -7
  [4,16,-0.902,10.394,-7,-1.422,11.15,-7,0.902,10.394,-7,0.262,9.638,-7],
// 4 16 -2.151 12.911 -7 -1.7 13.644 -7 -0.88 13.373 -7 1.422 11.15 -7
  [4,16,-2.151,12.911,-7,-1.7,13.644,-7,-0.88,13.373,-7,1.422,11.15,-7],
// 3 16 1.422 11.15 -7 -0.88 13.373 -7 0 13.28 -7
  [3,16,1.422,11.15,-7,-0.88,13.373,-7,0,13.28,-7],
// 4 16 1.422 11.15 -7 0 13.28 -7 0.88 13.373 -7 1.8465 12.0305 -7
  [4,16,1.422,11.15,-7,0,13.28,-7,0.88,13.373,-7,1.8465,12.0305,-7],
// 4 16 1.8465 12.0305 -7 0.88 13.373 -7 1.7 13.644 -7 2.151 12.911 -7
  [4,16,1.8465,12.0305,-7,0.88,13.373,-7,1.7,13.644,-7,2.151,12.911,-7],
// 3 16 2.151 12.911 -7 1.7 13.644 -7 2.296 14.01 -7
  [3,16,2.151,12.911,-7,1.7,13.644,-7,2.296,14.01,-7],
// 3 16 -2.151 12.911 -7 -2.296 14.01 -7 -1.7 13.644 -7
  [3,16,-2.151,12.911,-7,-2.296,14.01,-7,-1.7,13.644,-7],
// 3 16 -3.5595 6.1515 -7 -3.916 6.38 -7 -2.7 6.59 -7
  [3,16,-3.5595,6.1515,-7,-3.916,6.38,-7,-2.7,6.59,-7],
// 4 16 -2.7 6.59 -7 -1.655 5.5345 -7 -3.203 5.953 -7 -3.5595 6.1515 -7
  [4,16,-2.7,6.59,-7,-1.655,5.5345,-7,-3.203,5.953,-7,-3.5595,6.1515,-7],
// 4 16 -4.9 7.5 -7 -5.67 7.601 -7 -5.918 7.767 -7 -3.9555 7.5745 -7
  [4,16,-4.9,7.5,-7,-5.67,7.601,-7,-5.918,7.767,-7,-3.9555,7.5745,-7],
// 4 16 -2.1305 8.0135 -7 -3.011 7.749 -7 -3.9555 7.5745 -7 -5.918 7.767 -7
  [4,16,-2.1305,8.0135,-7,-3.011,7.749,-7,-3.9555,7.5745,-7,-5.918,7.767,-7],
// 4 16 -0.262 9.638 -7 -0.902 10.394 -7 0.262 9.638 -7 0 9.437 -7
  [4,16,-0.262,9.638,-7,-0.902,10.394,-7,0.262,9.638,-7,0,9.437,-7],
// 4 16 -0.977 8.687 -7 -1.25 8.478 -7 -7.732 10.482 -7 -1.11 8.79 -7
  [4,16,-0.977,8.687,-7,-1.25,8.478,-7,-7.732,10.482,-7,-1.11,8.79,-7],
];
module ldraw_lib__60601p01(step=0, col=false, unit=2/5, alt=false, line=0.2, solid=!$preview)
    makepoly(ldraw_lib__60601p01(solid), step=step, col=col, unit=unit, alt=alt, line=line, solid=solid);
ldraw_lib__60601p01(line=0.2);
